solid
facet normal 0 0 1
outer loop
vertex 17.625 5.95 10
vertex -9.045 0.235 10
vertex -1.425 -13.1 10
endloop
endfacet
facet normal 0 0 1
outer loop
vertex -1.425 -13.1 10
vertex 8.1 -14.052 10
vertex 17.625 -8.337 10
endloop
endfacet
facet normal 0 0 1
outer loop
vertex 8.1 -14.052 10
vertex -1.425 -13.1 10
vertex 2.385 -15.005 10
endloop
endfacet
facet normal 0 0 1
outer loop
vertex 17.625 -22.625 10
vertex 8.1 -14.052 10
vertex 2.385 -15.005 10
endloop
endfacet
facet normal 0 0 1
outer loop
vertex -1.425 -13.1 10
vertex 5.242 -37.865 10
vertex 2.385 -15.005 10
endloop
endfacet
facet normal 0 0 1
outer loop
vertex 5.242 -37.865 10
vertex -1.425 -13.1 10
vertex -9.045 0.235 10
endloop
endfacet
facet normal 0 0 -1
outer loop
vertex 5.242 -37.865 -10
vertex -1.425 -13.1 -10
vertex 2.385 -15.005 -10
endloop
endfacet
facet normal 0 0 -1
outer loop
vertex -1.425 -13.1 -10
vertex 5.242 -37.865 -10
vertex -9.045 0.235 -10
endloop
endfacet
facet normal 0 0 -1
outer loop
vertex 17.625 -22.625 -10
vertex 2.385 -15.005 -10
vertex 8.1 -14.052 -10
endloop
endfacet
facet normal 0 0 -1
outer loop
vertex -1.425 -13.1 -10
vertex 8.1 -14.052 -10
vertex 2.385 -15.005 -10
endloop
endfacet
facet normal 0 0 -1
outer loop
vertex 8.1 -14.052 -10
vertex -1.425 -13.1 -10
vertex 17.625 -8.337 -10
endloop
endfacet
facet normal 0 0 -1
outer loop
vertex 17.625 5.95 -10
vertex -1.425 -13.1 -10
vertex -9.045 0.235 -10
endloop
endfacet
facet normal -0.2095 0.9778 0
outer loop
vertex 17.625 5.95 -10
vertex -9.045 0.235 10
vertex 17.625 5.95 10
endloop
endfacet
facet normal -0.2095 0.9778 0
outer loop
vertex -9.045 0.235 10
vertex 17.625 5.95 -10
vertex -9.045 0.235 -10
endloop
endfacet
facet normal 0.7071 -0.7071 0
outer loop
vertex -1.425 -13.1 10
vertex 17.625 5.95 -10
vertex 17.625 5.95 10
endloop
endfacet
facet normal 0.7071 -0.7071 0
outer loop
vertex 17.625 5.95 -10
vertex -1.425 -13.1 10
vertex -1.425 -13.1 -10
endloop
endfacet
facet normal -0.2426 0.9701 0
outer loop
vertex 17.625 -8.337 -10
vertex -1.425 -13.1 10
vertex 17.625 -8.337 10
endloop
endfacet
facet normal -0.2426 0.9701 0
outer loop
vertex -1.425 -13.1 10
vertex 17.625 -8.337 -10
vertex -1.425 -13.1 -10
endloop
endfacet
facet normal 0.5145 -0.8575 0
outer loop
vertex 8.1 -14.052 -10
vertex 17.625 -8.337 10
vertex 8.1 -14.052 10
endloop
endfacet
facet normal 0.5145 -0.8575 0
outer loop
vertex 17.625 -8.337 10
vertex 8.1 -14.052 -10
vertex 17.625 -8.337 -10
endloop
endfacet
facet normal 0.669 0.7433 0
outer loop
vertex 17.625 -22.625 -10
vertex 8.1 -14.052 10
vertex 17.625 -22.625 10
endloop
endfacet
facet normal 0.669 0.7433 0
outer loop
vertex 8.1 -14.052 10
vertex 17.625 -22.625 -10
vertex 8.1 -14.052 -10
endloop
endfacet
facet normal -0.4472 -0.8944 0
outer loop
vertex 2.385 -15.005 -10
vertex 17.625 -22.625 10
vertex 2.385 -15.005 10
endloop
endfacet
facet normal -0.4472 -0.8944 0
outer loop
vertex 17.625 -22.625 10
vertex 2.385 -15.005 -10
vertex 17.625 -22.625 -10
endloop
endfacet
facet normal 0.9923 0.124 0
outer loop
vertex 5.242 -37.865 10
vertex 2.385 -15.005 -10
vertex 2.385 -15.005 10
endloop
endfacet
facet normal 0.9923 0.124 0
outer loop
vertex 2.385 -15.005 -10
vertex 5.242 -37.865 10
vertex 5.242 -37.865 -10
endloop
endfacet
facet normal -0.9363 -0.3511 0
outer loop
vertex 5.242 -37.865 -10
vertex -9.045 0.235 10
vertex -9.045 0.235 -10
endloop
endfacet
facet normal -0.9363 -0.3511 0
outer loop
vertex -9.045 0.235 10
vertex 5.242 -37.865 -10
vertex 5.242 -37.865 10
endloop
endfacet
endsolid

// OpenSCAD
translate([-30, +25])
polyhedron(
    points=[
    [20.955, -24.765, 10],
    [47.625, -19.05, 10],
    [28.575, -38.1, 10],
    [47.625, -33.3375, 10],
    [38.1, -39.0525, 10],
    [47.625, -47.625, 10],
    [32.385, -40.005, 10],
    [35.2425, -62.865, 10],

    [20.955, -24.765, -10],
    [47.625, -19.05, -10],
    [28.575, -38.1, -10],
    [47.625, -33.3375, -10],
    [38.1, -39.0525, -10],
    [47.625, -47.625, -10],
    [32.385, -40.005, -10],
    [35.2425, -62.865, -10],
    ],
    faces=[
        [0,1,2,3,4,5,6,7],
        [15,14,13,12,11,10,9,8],
        [0,8,9,1],
        [1,9,10,2],
        [2,10,11,3],
        [3,11,12,4],
        [4,12,13,5],
        [5,13,14,6],
        [6,14,15,7],
        [7,15,8,0],
    ]
);
